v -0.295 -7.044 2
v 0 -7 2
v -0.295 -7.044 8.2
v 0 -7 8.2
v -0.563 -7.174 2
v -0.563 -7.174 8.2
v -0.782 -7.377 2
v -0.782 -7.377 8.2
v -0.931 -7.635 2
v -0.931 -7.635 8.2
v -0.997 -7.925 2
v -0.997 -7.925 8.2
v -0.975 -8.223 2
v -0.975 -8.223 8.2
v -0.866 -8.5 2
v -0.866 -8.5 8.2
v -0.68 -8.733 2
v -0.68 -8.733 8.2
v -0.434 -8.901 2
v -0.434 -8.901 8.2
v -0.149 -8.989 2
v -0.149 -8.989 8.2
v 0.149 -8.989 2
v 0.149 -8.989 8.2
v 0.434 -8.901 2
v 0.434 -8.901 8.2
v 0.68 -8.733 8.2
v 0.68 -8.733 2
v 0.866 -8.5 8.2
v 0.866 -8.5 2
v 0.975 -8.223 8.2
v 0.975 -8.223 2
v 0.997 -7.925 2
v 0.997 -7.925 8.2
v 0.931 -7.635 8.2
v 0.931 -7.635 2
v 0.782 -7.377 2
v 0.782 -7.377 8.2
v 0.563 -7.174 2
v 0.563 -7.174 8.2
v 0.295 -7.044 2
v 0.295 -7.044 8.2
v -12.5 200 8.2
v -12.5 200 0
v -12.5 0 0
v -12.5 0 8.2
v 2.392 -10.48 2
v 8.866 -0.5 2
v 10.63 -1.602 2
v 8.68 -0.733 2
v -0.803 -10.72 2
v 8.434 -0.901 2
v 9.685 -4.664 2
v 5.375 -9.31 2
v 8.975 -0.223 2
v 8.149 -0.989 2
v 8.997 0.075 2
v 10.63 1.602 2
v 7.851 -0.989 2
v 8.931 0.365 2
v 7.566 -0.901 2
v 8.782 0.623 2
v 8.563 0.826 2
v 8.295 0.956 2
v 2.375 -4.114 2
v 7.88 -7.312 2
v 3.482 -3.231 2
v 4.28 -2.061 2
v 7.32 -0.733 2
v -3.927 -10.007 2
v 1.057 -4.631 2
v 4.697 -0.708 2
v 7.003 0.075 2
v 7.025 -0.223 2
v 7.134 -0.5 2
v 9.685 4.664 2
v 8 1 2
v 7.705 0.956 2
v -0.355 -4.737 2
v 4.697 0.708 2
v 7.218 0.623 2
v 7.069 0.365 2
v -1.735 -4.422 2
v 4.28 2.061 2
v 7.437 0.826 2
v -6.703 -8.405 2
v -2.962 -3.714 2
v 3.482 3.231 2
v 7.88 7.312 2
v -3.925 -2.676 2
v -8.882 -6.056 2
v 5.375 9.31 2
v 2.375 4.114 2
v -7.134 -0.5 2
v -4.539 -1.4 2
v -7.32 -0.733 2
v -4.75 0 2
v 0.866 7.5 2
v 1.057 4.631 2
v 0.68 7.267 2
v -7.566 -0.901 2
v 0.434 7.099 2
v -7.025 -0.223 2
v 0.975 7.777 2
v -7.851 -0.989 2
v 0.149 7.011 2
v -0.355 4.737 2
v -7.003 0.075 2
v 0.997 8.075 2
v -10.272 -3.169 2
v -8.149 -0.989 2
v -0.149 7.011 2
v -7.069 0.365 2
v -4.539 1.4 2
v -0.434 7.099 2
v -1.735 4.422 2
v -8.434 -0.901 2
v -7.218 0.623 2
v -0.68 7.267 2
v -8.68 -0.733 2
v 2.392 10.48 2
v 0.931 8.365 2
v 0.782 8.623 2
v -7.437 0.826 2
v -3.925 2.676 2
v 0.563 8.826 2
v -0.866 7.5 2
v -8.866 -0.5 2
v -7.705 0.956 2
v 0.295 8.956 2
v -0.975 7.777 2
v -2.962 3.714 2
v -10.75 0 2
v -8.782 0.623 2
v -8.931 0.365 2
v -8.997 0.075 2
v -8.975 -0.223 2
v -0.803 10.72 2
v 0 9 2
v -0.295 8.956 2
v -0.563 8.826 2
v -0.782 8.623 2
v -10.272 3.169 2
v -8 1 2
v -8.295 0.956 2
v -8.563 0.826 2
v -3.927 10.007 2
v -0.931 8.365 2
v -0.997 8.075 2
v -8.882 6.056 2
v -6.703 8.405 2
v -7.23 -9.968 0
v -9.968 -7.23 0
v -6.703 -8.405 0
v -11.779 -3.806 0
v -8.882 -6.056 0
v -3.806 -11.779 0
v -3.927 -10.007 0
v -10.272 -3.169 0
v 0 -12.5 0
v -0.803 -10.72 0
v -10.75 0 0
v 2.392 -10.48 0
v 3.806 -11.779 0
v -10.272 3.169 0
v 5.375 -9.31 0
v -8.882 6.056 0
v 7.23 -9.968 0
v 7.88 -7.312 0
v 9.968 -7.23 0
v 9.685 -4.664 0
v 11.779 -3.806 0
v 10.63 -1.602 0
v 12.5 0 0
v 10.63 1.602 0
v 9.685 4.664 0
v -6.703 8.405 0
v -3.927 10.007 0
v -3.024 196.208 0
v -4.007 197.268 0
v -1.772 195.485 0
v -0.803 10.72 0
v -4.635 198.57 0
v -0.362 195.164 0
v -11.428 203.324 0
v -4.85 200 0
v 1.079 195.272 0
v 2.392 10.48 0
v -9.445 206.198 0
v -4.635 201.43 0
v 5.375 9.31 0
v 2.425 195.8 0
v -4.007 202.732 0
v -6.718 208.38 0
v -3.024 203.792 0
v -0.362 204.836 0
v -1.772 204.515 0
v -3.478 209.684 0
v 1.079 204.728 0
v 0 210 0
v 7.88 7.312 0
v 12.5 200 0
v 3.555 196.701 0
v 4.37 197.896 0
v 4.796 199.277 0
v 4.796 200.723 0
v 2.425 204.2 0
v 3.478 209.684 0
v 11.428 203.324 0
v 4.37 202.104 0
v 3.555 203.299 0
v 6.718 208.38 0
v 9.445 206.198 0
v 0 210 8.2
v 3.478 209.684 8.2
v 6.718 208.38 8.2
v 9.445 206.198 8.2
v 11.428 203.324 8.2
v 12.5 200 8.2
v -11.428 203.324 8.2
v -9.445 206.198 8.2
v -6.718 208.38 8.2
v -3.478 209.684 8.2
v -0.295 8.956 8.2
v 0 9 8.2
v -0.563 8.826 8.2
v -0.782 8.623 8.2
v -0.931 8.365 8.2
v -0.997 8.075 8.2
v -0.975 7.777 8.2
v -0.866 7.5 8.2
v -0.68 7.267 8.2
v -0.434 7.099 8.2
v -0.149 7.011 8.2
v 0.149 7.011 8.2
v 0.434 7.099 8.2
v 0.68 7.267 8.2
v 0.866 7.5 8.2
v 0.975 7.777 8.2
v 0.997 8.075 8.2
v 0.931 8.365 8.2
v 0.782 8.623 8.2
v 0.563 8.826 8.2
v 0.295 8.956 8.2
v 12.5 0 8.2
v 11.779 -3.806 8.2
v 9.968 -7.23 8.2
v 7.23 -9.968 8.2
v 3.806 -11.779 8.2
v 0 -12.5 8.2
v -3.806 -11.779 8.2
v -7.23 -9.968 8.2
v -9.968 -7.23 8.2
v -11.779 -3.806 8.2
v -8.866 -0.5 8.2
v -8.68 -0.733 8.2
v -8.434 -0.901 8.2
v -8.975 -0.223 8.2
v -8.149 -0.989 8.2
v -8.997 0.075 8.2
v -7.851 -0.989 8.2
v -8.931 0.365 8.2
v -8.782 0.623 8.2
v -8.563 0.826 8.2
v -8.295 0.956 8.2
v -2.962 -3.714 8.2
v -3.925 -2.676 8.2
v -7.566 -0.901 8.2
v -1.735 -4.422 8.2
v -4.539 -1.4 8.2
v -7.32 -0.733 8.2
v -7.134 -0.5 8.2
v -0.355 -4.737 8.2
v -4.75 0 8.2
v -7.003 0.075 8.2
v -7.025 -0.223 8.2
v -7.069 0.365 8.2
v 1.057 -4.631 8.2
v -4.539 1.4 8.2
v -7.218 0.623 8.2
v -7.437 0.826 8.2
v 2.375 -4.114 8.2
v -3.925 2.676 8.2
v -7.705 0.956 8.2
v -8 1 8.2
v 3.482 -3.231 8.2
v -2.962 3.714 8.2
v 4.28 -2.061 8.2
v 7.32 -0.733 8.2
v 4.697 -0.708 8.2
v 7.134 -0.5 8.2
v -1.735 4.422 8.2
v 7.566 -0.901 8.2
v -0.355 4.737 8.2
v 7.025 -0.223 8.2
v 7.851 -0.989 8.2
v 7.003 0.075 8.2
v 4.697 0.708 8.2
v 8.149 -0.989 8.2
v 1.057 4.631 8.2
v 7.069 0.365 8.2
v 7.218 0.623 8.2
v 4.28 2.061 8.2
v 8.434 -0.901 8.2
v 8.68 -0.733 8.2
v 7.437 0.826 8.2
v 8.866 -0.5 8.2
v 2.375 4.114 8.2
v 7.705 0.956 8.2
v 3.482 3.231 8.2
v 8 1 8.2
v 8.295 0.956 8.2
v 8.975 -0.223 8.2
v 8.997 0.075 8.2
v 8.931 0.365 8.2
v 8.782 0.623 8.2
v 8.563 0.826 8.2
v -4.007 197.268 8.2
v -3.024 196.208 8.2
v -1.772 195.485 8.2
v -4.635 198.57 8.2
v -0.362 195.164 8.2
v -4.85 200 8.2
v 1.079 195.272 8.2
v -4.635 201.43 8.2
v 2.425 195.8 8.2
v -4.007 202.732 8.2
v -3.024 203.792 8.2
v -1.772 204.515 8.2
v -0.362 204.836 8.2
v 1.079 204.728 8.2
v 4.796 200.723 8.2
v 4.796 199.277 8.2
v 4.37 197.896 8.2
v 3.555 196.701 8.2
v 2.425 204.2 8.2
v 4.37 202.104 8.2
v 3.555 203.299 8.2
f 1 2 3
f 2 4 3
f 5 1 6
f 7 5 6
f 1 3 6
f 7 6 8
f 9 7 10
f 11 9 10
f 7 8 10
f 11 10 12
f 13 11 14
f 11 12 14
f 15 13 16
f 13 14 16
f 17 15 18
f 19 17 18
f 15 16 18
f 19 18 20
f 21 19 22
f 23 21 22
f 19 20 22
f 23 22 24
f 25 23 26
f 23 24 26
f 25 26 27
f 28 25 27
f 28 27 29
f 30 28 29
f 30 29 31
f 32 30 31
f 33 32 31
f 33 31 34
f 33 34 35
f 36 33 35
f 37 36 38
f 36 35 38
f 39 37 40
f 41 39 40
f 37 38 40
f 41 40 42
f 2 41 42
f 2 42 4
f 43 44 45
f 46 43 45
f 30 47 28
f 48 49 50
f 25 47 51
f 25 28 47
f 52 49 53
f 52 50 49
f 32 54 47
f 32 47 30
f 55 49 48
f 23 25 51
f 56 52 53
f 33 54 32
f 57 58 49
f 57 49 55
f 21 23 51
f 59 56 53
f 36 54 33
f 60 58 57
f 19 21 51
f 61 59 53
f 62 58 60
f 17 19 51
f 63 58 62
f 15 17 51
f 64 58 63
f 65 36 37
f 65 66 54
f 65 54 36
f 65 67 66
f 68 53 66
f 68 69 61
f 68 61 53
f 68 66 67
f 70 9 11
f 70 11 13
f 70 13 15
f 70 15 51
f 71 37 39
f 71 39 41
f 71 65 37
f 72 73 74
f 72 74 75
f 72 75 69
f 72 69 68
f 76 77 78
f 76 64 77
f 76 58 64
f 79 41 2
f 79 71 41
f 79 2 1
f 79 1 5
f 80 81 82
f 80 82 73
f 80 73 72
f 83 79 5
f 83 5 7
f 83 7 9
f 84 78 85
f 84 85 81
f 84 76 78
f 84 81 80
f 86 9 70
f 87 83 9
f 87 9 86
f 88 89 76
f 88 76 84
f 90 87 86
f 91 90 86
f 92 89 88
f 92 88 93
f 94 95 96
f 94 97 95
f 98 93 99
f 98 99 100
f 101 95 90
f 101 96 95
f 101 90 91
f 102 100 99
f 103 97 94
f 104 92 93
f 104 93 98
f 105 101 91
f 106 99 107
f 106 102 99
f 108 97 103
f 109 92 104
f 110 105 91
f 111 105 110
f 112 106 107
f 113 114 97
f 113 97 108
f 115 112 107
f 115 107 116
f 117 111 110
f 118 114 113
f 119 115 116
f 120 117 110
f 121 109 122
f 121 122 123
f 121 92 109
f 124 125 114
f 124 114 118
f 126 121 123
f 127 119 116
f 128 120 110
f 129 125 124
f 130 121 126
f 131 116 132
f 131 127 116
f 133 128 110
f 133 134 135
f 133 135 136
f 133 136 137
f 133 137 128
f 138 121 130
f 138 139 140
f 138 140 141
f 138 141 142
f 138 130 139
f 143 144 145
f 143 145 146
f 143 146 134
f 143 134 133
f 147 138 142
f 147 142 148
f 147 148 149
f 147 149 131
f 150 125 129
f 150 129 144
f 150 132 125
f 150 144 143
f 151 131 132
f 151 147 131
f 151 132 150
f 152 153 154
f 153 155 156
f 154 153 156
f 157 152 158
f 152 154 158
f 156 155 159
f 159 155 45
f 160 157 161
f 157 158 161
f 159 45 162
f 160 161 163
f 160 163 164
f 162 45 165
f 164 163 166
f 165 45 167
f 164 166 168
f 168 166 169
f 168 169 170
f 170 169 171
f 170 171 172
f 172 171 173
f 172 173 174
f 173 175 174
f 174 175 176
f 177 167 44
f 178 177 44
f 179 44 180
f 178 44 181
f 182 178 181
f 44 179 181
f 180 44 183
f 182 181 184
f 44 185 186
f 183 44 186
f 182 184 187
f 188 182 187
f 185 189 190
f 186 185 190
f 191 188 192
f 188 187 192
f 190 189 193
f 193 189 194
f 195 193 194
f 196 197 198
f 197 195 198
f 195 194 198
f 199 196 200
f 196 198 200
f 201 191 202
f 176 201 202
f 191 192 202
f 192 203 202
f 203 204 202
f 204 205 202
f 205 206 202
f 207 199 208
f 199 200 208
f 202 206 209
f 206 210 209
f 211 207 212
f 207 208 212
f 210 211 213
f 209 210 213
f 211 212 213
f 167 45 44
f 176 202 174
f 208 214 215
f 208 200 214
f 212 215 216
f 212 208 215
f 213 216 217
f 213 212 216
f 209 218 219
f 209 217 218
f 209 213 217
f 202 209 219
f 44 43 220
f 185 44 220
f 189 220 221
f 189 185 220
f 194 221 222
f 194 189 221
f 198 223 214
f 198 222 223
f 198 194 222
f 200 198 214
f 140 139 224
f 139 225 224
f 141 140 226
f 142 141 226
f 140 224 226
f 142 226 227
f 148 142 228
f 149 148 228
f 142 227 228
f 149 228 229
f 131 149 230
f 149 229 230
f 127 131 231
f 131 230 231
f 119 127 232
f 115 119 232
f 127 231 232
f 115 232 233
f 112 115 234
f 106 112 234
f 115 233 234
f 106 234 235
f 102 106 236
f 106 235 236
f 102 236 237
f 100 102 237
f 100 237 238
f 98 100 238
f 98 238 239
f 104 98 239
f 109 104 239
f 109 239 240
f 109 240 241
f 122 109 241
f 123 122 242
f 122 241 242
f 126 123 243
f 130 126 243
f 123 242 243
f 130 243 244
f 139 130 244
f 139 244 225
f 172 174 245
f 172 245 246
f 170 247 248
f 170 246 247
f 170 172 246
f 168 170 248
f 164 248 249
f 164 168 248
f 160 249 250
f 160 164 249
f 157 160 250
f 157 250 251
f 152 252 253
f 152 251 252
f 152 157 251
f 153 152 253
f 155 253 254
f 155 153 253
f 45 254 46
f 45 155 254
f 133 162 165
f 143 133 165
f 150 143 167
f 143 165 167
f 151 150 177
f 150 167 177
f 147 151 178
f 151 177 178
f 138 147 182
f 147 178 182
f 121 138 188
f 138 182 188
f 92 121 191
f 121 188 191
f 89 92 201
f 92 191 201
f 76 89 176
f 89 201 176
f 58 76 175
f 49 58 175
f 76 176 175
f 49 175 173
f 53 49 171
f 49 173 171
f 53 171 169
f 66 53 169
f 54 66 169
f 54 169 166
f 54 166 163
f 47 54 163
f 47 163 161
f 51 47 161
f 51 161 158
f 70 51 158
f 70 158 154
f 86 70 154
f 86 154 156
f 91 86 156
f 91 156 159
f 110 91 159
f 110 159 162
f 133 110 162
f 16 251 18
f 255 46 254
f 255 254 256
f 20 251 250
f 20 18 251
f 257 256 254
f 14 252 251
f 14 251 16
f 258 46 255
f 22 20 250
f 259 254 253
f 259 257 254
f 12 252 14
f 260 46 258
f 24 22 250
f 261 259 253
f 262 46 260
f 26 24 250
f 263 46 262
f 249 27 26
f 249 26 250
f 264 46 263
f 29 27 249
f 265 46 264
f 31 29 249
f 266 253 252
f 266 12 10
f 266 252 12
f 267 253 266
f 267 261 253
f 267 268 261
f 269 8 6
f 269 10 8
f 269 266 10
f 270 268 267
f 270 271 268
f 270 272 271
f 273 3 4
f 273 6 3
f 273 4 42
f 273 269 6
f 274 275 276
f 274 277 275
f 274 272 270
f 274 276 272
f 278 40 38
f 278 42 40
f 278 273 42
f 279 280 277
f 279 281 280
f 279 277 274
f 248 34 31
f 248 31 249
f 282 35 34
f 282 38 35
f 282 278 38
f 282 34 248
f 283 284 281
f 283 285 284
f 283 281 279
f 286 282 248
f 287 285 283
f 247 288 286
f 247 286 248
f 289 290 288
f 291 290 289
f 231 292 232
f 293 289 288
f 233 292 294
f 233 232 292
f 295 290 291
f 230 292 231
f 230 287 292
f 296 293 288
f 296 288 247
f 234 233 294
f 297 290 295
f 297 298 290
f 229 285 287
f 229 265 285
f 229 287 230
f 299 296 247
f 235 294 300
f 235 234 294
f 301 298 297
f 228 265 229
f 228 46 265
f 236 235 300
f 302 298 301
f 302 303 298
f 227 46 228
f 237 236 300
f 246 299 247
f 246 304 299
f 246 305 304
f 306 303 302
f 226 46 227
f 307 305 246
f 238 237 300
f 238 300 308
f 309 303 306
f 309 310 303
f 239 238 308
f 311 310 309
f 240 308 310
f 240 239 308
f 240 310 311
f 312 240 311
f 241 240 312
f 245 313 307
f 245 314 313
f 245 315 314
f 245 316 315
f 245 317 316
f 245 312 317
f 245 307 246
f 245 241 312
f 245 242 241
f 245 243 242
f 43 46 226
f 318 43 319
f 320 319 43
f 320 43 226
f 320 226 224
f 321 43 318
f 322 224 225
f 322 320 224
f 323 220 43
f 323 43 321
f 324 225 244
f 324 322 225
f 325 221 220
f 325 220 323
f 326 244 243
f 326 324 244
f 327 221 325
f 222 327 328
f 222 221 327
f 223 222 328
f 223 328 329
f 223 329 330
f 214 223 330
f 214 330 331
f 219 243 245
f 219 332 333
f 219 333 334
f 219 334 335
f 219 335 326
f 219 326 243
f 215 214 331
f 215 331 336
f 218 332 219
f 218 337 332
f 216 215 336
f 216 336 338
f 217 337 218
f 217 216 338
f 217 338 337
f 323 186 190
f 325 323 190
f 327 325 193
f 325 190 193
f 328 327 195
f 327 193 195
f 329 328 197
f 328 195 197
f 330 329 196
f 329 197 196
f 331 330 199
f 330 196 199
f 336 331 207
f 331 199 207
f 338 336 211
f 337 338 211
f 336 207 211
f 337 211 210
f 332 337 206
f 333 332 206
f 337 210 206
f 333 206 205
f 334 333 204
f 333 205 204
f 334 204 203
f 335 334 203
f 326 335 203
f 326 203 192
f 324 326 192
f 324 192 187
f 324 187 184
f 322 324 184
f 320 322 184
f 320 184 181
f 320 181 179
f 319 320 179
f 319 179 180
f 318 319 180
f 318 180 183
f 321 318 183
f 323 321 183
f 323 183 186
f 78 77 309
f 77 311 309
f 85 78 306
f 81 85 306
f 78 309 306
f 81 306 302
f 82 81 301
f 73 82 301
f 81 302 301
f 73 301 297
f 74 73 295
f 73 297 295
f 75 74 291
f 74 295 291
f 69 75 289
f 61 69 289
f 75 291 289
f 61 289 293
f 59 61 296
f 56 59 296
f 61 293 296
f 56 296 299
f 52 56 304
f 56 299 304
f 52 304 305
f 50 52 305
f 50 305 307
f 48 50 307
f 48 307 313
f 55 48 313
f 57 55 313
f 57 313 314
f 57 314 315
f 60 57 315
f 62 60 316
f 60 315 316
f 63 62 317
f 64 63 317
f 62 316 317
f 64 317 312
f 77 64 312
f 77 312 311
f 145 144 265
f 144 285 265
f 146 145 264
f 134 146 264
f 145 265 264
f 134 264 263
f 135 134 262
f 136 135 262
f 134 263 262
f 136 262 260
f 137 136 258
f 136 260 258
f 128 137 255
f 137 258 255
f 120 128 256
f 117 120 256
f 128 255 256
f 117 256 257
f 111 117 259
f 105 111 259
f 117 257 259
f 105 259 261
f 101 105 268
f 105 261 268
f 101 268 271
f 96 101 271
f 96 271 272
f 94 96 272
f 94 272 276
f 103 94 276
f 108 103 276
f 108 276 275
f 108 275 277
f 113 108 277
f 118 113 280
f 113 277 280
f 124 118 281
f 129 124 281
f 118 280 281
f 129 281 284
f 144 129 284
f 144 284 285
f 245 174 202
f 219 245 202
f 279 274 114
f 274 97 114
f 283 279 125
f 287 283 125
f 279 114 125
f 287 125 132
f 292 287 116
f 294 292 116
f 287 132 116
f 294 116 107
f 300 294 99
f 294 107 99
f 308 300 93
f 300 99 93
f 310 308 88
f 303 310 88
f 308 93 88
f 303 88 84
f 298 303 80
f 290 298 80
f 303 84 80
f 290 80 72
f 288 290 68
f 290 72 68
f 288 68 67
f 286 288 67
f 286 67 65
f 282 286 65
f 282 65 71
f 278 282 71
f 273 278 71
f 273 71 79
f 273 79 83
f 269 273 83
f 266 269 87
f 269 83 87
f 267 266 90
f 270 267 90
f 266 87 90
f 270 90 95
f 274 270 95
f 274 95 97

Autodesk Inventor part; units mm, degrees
ref_plane "YZ Plane" through (0, 0, 0) normal (1, 0, 0) x (0, 1, 0)
ref_plane "XZ Plane" through (0, 0, 0) normal (0, 1, 0) x (-1, 0, 0)
ref_plane "XY Plane" through (0, 0, 0) normal (0, 0, 1) x (1, 0, 0)
sketch "Sketch1" plane through (0, 0, 0) normal (0, 0, 1) x (1, 0, 0)
  arc A0 (10.5, 0) -> (0, -10.5) centre (0, 0) ccw
  circle A1 centre (0, 8) radius 0.5
  circle A2 centre (-8, 0) radius 0.5
  circle A3 centre (0, -8) radius 0.5
  circle A4 centre (8, 0) radius 0.5
  line L0 (-10.5, 0) -> (-12.5, 0) construction
  arc A5 (0, -10.5) -> (10.5, 0) centre (0, 0) ccw
  line L1 (10.5, 0) -> (12.5, 0)
  line L2 (0, -10.5) -> (0, -12.5) construction
  arc A6 (-12.5, 0) -> (0, -12.5) centre (0.4907, 0.4907) ccw
  arc A7 (0, -12.5) -> (12.5, 0) centre (-0.4907, 0.4907) ccw
  line L3 (-12.5, 0) -> (12.5, 0) construction
  line L4 (12.5, 0) -> (12.5, 200)
  line L5 (12.5, 200) -> (-12.5, 200) construction
  line L6 (-12.5, 200) -> (-12.5, 0)
  arc A8 (4.85, 200) -> (-4.85, 200) centre (0, 200) ccw
  line L7 (0, 200) -> (0, 210) construction
  arc A9 (0, 210) -> (-12.5, 200) centre (-0.6647, 198.0184) ccw
  arc A10 (12.5, 200) -> (0, 210) centre (0.6647, 198.0184) ccw
  arc A11 (-4.85, 200) -> (4.85, 200) centre (0, 200) ccw
  dimension "d0" = 21
  dimension "d1" = 1
  dimension "d2" = 1
  dimension "d3" = 1
  dimension "d4" = 1
  dimension "d5" = 8
  dimension "d6" = 8
  dimension "d7" = 8
  dimension "d8" = 8
  dimension "d14" = 12.5
  dimension "d15" = 12.5
  dimension "d16" = 12.5
  dimension "d17" = 2
  dimension "d18" = 2
  dimension "d19" = 2
  dimension "d20" = 13
  dimension "d21" = 13
  dimension "d30" = 200
  dimension "d31" = 9.7
  dimension "d32" = 12.5
  dimension "d34" = 2.5
  dimension "d35" = 2.5
  dimension "d36" = 2.5
  dimension "d37" = 10
  dimension "d38" = 12
  dimension "d39" = 12
sketch "Sketch2" plane through (0, 0, 0) normal (0, 0, 1) x (1, 0, 0)
  arc A0 (10.5, 0) -> (0, -10.5) centre (0, 0) ccw projected
  circle A1 centre (-8, 0) radius 0.5 projected
  circle A2 centre (0, -8) radius 0.5 projected
  circle A3 centre (8, 0) radius 0.5 projected
  circle A4 centre (0, 8) radius 0.5 projected
  arc A5 (0, -10.5) -> (10.5, 0) centre (0, 0) ccw projected
sketch "Sketch3" plane through (0, 0, 0) normal (0, 0, 1) x (1, 0, 0)
  arc A0 (0, 210) -> (-12.5, 200) centre (-0.6647, 198.0184) ccw projected
  line L0 (-12.5, 200) -> (-12.5, 0) projected
  arc A1 (-12.5, 0) -> (0, -12.5) centre (0.4907, 0.4907) ccw projected
  arc A2 (0, -12.5) -> (12.5, 0) centre (-0.4907, 0.4907) ccw projected
  line L1 (12.5, 0) -> (12.5, 200) projected
  arc A3 (12.5, 200) -> (0, 210) centre (0.6647, 198.0184) ccw projected
  point P0 (0, 0)
extrude "Extrusion1" add sketch "Sketch3" along normal blind 8.2
extrude "Extrusion2" cut sketch "Sketch1" along normal blind 10 contours A11 A8
extrude "Extrusion3" cut sketch "Sketch2" along normal blind 2
sketch "Sketch4" plane through (8, 0, 0) normal (0, 0, -1) x (-1, 0, 0)
  circle A0 centre (0, 0) radius 0.5 projected
  circle A1 centre (8, 8) radius 0.5 projected
  circle A2 centre (16, 0) radius 0.5 projected
  circle A3 centre (8, -8) radius 0.5 projected
  point P0 (8, 0)
hole "Hole1" at (0, 8, 0) at (8, 0, 0) at (0, -8, 0) at (-8, 0, 0) direction (0, 0, 1) diameter 2 depth 10 tip angle 118
sketch "Sketch5" plane through (0, 0, 8.2) normal (0, 0, 1) x (1, 0, 0)
  point P0 (0, 0)
sketch "Sketch6" plane through (0, 0, 8.2) normal (0, 0, 1) x (1, 0, 0)
  circle A0 centre (0, 200) radius 4.85 projected
  point P0 (0, 0)
sketch "Sketch7" plane through (0, 0, 8.2) normal (0, 0, 1) x (1, 0, 0)
  point P0 (0, 0)
sketch "Sketch9" plane through (0, 0, 0) normal (0, 0, -1) x (-1, 0, 0)
  circle A0 centre (0, 0) radius 10.75
  dimension "d55" = 21.5
extrude "Extrusion5" cut sketch "Sketch9" against normal blind 2
sketch "Sketch10" plane through (0, 0, 2) normal (0, 0, -1) x (-1, 0, 0)
  circle A0 centre (0, 0) radius 4.75
  dimension "d58" = 9.5
extrude "Extrusion6" cut sketch "Sketch10" against normal blind 10
properties part number "BB-8_headslider_rod"
